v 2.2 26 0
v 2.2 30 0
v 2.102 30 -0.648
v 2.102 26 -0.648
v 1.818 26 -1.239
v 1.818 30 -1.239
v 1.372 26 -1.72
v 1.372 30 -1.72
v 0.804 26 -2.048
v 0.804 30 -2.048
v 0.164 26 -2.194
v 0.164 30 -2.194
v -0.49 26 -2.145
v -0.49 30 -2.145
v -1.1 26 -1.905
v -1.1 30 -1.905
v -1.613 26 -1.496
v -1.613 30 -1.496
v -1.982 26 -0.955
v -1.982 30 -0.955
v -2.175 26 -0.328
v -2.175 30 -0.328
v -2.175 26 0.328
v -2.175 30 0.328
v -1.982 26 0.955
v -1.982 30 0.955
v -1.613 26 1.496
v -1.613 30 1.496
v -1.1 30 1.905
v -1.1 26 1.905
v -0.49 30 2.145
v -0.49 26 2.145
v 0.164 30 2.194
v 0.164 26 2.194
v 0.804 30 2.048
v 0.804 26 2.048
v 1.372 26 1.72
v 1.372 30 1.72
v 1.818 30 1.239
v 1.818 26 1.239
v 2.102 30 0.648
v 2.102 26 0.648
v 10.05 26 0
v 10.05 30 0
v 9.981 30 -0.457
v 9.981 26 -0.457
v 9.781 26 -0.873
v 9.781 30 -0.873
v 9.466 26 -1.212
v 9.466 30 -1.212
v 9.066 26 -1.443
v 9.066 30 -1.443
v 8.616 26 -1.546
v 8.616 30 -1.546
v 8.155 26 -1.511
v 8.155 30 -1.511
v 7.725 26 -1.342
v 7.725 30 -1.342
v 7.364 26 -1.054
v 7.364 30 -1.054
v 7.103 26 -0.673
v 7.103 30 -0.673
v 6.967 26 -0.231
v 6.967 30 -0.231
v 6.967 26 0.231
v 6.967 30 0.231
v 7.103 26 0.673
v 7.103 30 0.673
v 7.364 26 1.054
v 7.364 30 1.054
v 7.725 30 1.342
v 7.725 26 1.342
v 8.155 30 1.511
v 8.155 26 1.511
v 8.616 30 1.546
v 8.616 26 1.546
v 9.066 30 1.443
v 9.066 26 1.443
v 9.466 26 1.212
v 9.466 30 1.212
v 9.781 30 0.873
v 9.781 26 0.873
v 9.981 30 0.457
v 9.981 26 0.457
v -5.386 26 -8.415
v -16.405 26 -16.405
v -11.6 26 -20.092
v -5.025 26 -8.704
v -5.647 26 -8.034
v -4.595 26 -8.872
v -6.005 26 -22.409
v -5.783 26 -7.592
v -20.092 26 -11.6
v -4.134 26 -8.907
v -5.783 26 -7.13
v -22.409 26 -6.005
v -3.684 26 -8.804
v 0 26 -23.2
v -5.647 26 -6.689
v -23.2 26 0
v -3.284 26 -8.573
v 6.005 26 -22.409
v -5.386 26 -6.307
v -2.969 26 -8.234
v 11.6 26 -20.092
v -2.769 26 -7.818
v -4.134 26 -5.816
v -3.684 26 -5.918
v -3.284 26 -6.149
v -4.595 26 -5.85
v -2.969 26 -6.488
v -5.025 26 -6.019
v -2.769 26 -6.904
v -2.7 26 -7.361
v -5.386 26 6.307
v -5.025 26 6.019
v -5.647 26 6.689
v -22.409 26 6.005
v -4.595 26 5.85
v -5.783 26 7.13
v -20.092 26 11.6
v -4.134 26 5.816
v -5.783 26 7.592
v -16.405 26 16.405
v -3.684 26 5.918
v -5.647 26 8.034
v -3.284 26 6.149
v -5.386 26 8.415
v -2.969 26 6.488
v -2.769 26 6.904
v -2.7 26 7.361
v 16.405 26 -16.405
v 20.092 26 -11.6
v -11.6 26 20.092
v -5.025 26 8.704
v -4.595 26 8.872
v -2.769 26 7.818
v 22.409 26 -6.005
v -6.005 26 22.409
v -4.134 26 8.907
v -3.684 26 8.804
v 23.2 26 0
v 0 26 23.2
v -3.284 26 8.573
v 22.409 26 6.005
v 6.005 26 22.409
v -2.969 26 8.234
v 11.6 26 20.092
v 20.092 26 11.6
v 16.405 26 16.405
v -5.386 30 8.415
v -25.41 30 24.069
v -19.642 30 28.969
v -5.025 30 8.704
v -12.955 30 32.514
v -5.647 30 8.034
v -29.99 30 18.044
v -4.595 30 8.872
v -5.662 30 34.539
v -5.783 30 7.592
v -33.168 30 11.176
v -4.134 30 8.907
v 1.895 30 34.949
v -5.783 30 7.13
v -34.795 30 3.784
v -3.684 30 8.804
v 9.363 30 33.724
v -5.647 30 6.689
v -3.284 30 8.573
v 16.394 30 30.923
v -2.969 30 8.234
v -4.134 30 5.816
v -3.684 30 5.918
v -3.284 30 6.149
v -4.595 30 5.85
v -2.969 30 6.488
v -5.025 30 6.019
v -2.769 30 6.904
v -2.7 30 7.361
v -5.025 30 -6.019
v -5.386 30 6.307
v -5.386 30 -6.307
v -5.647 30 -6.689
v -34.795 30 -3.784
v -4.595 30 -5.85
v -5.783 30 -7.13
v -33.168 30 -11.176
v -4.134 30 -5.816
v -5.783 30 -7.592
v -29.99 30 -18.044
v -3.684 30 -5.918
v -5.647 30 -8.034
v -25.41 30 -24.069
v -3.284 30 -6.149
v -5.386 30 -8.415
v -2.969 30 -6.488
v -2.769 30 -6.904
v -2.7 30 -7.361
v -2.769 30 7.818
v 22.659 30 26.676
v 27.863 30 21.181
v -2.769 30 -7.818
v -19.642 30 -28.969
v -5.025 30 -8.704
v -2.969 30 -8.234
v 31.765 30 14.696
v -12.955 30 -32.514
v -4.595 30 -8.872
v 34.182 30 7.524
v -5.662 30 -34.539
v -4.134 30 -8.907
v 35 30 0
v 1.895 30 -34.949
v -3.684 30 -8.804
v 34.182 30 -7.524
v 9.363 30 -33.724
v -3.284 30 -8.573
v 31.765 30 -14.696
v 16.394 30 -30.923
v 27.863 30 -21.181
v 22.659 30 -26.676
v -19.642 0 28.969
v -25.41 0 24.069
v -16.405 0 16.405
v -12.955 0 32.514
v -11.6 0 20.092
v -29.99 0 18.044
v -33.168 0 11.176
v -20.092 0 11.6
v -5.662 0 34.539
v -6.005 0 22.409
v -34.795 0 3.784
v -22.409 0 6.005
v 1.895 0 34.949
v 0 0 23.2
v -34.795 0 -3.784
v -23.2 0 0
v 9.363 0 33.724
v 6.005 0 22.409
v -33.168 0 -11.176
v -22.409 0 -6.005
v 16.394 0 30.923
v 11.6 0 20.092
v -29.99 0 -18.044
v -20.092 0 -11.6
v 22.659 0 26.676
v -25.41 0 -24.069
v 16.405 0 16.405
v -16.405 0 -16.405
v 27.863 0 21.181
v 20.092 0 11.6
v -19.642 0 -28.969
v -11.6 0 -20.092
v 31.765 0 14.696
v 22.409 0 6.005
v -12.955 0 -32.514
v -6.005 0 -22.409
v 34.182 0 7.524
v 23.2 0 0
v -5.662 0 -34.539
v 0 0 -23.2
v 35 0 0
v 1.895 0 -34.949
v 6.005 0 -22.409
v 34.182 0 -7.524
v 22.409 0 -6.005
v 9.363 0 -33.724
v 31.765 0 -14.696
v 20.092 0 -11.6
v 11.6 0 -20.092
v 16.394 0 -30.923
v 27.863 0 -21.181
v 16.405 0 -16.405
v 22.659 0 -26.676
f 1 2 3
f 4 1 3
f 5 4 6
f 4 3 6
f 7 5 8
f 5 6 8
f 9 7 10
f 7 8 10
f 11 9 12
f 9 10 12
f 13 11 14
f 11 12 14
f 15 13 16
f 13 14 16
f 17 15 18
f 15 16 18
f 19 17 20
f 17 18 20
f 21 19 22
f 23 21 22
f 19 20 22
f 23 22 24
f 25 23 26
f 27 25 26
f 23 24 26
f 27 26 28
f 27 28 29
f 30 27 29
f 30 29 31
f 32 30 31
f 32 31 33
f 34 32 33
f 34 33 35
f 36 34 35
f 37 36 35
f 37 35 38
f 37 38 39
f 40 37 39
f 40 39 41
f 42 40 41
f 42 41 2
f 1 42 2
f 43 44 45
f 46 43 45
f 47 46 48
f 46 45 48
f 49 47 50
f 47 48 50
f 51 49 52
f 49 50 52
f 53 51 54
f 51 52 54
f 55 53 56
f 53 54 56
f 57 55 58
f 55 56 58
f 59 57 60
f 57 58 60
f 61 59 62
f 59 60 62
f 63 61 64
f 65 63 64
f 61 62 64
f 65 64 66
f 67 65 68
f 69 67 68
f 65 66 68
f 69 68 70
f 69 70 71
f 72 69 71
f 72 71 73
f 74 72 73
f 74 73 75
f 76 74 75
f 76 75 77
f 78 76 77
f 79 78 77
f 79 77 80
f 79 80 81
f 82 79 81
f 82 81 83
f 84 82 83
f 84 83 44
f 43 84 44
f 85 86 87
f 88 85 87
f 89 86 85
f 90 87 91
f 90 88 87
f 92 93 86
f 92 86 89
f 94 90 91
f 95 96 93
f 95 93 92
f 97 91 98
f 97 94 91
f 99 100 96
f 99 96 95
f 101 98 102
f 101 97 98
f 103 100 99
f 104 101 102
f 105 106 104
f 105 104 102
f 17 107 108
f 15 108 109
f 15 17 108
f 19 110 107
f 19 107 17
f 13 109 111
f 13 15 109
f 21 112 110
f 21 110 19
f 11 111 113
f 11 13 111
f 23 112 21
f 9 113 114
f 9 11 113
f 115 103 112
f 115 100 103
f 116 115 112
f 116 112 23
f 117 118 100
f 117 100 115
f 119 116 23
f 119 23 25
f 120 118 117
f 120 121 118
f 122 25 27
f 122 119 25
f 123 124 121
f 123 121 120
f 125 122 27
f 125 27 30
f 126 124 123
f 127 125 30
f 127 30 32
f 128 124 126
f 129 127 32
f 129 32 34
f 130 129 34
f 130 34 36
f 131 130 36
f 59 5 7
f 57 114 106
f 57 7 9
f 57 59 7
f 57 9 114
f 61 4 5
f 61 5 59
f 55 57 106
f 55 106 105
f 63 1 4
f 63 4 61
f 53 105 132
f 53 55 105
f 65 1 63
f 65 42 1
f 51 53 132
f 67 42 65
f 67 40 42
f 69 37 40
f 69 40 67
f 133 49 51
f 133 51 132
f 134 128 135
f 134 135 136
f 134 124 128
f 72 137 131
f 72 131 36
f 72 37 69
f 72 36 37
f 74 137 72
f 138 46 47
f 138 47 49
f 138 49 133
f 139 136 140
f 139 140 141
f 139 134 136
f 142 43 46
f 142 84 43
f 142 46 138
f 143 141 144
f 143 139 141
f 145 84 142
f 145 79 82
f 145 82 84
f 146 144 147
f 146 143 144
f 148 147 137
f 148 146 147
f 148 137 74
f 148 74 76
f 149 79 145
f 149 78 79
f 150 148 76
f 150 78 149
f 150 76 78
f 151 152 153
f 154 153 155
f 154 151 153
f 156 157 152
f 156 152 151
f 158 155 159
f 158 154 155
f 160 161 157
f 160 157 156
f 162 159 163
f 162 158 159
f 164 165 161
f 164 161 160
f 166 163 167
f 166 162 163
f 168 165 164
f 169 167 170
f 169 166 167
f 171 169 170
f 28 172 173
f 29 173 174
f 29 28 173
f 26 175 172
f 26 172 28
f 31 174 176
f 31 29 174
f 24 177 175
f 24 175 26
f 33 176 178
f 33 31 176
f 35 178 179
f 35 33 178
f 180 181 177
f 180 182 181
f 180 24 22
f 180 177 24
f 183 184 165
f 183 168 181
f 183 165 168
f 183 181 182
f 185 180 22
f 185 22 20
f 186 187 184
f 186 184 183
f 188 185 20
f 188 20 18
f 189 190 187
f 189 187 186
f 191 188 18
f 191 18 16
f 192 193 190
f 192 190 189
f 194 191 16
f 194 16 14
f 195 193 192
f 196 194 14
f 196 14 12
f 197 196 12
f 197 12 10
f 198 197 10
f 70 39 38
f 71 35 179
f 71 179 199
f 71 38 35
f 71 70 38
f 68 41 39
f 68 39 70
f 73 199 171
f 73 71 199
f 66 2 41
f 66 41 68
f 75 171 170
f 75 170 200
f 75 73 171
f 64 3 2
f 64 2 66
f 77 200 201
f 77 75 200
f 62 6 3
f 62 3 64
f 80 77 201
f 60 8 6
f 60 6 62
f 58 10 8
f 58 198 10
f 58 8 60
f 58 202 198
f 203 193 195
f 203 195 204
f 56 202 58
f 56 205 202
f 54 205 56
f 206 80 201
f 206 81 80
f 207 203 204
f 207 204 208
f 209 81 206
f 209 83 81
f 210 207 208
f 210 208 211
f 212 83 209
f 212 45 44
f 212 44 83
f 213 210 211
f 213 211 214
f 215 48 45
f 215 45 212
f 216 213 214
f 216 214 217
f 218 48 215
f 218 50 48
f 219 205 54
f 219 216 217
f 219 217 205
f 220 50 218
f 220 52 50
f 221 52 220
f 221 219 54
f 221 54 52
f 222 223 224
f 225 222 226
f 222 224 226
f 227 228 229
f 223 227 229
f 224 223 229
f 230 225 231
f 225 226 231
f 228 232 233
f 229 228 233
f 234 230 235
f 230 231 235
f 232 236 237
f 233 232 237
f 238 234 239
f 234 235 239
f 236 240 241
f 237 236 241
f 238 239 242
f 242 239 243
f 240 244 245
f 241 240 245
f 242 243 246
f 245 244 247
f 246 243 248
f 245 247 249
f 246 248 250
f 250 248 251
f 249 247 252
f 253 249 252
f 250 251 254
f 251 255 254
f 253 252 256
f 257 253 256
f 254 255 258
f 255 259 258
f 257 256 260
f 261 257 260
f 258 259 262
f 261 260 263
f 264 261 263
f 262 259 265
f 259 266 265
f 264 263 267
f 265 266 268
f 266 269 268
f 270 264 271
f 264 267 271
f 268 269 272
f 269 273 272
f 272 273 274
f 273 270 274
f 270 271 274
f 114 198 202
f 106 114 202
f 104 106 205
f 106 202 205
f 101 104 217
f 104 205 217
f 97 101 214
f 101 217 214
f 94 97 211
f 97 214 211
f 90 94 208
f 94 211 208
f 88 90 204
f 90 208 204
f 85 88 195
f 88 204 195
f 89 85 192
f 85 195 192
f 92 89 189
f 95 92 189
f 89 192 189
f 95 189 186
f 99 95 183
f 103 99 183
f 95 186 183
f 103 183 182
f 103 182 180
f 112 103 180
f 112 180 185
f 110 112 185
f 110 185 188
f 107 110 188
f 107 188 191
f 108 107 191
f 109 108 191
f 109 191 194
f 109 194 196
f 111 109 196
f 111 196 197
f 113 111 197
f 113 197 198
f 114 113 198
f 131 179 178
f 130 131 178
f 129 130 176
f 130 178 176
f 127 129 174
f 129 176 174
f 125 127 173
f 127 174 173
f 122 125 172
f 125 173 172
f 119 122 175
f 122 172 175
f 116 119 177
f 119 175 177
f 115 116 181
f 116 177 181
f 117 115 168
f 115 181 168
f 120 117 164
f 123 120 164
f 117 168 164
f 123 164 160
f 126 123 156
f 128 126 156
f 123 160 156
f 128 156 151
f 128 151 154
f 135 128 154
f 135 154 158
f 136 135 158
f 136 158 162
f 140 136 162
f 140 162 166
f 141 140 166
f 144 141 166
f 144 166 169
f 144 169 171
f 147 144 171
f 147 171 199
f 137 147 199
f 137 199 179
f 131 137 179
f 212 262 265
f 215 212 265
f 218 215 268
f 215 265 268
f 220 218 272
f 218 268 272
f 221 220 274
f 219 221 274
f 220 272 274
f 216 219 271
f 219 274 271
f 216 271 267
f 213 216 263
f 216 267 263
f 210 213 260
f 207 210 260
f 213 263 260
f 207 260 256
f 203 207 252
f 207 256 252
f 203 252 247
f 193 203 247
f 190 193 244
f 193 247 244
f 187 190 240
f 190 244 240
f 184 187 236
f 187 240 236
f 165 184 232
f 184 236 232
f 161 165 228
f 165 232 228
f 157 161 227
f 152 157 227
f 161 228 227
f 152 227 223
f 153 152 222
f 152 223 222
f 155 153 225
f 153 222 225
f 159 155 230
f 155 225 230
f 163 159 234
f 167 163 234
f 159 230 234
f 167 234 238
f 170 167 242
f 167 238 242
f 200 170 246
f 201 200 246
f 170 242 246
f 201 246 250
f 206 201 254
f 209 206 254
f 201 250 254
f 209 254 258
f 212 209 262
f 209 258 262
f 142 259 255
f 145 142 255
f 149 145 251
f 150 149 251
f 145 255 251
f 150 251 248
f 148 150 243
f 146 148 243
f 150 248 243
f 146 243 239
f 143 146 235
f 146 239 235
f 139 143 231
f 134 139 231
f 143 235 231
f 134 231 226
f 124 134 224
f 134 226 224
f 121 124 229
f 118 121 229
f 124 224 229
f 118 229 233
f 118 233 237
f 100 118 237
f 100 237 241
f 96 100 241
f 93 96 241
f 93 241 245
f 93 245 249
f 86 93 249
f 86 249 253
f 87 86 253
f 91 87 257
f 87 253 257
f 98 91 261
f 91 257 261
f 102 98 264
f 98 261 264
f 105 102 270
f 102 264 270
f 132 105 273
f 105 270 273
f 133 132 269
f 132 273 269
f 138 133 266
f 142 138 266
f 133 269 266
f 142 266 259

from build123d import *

# Parameters (mm, degrees)
SKETCH_1_R          = 35
EXTRUDE_1_DEPTH     = 30
SKETCH_2_R          = 23.2
CUT_EXTRUDE_1_DEPTH = 26
CUT_EXTRUDE_2_REACH = 32
SKETCH_3_R          = 2.2
SKETCH_3_R_2        = 1.55


with BuildPart() as part:
    # 草图1 → 凸台-拉伸1 (new body)
    with BuildSketch(Plane(origin=(0, 0, 0), x_dir=(1, 0, 0), z_dir=(0, 1, 0))):
        Circle(SKETCH_1_R)
    extrude(amount=EXTRUDE_1_DEPTH)

    # 草图2 → 切除-拉伸1 (cut)
    with BuildSketch(Plane.XZ):
        Circle(SKETCH_2_R)
    extrude(amount=-CUT_EXTRUDE_1_DEPTH, mode=Mode.SUBTRACT)

    # 草图3 → 切除-拉伸2 (cut, up to next)
    with BuildSketch(Plane(origin=(0, 30, 0), x_dir=(1, 0, 0), z_dir=(0, 1, 0)), mode=Mode.PRIVATE) as cut_extrude_2_sk1:
        Circle(SKETCH_3_R)
    cut_extrude_2_tool1 = extrude(cut_extrude_2_sk1.sketch, amount=-CUT_EXTRUDE_2_REACH, mode=Mode.PRIVATE) & part.part
    add(cut_extrude_2_tool1.solids().sort_by_distance((0, 30, 0))[0], mode=Mode.SUBTRACT)
    # 草图3 → 切除-拉伸2 (cut, up to next)
    with BuildSketch(Plane(origin=(0, 30, 0), x_dir=(1, 0, 0), z_dir=(0, 1, 0)), mode=Mode.PRIVATE) as cut_extrude_2_sk2:
        with Locations((8.5, 0)):
            Circle(SKETCH_3_R_2)
    cut_extrude_2_tool2 = extrude(cut_extrude_2_sk2.sketch, amount=-CUT_EXTRUDE_2_REACH, mode=Mode.PRIVATE) & part.part
    add(cut_extrude_2_tool2.solids().sort_by_distance((8.5, 30, 0))[0], mode=Mode.SUBTRACT)
    # 草图3 → 切除-拉伸2 (cut, up to next)
    with BuildSketch(Plane(origin=(0, 30, 0), x_dir=(1, 0, 0), z_dir=(0, 1, 0)), mode=Mode.PRIVATE) as cut_extrude_2_sk3:
        with Locations((-4.25, -7.361215932)):
            Circle(SKETCH_3_R_2)
    cut_extrude_2_tool3 = extrude(cut_extrude_2_sk3.sketch, amount=-CUT_EXTRUDE_2_REACH, mode=Mode.PRIVATE) & part.part
    add(cut_extrude_2_tool3.solids().sort_by_distance((-4.25, 30, 7.361216))[0], mode=Mode.SUBTRACT)
    # 草图3 → 切除-拉伸2 (cut, up to next)
    with BuildSketch(Plane(origin=(0, 30, 0), x_dir=(1, 0, 0), z_dir=(0, 1, 0)), mode=Mode.PRIVATE) as cut_extrude_2_sk4:
        with Locations((-4.25, 7.361215932)):
            Circle(SKETCH_3_R_2)
    cut_extrude_2_tool4 = extrude(cut_extrude_2_sk4.sketch, amount=-CUT_EXTRUDE_2_REACH, mode=Mode.PRIVATE) & part.part
    add(cut_extrude_2_tool4.solids().sort_by_distance((-4.25, 30, -7.361216))[0], mode=Mode.SUBTRACT)


solid = part.part
